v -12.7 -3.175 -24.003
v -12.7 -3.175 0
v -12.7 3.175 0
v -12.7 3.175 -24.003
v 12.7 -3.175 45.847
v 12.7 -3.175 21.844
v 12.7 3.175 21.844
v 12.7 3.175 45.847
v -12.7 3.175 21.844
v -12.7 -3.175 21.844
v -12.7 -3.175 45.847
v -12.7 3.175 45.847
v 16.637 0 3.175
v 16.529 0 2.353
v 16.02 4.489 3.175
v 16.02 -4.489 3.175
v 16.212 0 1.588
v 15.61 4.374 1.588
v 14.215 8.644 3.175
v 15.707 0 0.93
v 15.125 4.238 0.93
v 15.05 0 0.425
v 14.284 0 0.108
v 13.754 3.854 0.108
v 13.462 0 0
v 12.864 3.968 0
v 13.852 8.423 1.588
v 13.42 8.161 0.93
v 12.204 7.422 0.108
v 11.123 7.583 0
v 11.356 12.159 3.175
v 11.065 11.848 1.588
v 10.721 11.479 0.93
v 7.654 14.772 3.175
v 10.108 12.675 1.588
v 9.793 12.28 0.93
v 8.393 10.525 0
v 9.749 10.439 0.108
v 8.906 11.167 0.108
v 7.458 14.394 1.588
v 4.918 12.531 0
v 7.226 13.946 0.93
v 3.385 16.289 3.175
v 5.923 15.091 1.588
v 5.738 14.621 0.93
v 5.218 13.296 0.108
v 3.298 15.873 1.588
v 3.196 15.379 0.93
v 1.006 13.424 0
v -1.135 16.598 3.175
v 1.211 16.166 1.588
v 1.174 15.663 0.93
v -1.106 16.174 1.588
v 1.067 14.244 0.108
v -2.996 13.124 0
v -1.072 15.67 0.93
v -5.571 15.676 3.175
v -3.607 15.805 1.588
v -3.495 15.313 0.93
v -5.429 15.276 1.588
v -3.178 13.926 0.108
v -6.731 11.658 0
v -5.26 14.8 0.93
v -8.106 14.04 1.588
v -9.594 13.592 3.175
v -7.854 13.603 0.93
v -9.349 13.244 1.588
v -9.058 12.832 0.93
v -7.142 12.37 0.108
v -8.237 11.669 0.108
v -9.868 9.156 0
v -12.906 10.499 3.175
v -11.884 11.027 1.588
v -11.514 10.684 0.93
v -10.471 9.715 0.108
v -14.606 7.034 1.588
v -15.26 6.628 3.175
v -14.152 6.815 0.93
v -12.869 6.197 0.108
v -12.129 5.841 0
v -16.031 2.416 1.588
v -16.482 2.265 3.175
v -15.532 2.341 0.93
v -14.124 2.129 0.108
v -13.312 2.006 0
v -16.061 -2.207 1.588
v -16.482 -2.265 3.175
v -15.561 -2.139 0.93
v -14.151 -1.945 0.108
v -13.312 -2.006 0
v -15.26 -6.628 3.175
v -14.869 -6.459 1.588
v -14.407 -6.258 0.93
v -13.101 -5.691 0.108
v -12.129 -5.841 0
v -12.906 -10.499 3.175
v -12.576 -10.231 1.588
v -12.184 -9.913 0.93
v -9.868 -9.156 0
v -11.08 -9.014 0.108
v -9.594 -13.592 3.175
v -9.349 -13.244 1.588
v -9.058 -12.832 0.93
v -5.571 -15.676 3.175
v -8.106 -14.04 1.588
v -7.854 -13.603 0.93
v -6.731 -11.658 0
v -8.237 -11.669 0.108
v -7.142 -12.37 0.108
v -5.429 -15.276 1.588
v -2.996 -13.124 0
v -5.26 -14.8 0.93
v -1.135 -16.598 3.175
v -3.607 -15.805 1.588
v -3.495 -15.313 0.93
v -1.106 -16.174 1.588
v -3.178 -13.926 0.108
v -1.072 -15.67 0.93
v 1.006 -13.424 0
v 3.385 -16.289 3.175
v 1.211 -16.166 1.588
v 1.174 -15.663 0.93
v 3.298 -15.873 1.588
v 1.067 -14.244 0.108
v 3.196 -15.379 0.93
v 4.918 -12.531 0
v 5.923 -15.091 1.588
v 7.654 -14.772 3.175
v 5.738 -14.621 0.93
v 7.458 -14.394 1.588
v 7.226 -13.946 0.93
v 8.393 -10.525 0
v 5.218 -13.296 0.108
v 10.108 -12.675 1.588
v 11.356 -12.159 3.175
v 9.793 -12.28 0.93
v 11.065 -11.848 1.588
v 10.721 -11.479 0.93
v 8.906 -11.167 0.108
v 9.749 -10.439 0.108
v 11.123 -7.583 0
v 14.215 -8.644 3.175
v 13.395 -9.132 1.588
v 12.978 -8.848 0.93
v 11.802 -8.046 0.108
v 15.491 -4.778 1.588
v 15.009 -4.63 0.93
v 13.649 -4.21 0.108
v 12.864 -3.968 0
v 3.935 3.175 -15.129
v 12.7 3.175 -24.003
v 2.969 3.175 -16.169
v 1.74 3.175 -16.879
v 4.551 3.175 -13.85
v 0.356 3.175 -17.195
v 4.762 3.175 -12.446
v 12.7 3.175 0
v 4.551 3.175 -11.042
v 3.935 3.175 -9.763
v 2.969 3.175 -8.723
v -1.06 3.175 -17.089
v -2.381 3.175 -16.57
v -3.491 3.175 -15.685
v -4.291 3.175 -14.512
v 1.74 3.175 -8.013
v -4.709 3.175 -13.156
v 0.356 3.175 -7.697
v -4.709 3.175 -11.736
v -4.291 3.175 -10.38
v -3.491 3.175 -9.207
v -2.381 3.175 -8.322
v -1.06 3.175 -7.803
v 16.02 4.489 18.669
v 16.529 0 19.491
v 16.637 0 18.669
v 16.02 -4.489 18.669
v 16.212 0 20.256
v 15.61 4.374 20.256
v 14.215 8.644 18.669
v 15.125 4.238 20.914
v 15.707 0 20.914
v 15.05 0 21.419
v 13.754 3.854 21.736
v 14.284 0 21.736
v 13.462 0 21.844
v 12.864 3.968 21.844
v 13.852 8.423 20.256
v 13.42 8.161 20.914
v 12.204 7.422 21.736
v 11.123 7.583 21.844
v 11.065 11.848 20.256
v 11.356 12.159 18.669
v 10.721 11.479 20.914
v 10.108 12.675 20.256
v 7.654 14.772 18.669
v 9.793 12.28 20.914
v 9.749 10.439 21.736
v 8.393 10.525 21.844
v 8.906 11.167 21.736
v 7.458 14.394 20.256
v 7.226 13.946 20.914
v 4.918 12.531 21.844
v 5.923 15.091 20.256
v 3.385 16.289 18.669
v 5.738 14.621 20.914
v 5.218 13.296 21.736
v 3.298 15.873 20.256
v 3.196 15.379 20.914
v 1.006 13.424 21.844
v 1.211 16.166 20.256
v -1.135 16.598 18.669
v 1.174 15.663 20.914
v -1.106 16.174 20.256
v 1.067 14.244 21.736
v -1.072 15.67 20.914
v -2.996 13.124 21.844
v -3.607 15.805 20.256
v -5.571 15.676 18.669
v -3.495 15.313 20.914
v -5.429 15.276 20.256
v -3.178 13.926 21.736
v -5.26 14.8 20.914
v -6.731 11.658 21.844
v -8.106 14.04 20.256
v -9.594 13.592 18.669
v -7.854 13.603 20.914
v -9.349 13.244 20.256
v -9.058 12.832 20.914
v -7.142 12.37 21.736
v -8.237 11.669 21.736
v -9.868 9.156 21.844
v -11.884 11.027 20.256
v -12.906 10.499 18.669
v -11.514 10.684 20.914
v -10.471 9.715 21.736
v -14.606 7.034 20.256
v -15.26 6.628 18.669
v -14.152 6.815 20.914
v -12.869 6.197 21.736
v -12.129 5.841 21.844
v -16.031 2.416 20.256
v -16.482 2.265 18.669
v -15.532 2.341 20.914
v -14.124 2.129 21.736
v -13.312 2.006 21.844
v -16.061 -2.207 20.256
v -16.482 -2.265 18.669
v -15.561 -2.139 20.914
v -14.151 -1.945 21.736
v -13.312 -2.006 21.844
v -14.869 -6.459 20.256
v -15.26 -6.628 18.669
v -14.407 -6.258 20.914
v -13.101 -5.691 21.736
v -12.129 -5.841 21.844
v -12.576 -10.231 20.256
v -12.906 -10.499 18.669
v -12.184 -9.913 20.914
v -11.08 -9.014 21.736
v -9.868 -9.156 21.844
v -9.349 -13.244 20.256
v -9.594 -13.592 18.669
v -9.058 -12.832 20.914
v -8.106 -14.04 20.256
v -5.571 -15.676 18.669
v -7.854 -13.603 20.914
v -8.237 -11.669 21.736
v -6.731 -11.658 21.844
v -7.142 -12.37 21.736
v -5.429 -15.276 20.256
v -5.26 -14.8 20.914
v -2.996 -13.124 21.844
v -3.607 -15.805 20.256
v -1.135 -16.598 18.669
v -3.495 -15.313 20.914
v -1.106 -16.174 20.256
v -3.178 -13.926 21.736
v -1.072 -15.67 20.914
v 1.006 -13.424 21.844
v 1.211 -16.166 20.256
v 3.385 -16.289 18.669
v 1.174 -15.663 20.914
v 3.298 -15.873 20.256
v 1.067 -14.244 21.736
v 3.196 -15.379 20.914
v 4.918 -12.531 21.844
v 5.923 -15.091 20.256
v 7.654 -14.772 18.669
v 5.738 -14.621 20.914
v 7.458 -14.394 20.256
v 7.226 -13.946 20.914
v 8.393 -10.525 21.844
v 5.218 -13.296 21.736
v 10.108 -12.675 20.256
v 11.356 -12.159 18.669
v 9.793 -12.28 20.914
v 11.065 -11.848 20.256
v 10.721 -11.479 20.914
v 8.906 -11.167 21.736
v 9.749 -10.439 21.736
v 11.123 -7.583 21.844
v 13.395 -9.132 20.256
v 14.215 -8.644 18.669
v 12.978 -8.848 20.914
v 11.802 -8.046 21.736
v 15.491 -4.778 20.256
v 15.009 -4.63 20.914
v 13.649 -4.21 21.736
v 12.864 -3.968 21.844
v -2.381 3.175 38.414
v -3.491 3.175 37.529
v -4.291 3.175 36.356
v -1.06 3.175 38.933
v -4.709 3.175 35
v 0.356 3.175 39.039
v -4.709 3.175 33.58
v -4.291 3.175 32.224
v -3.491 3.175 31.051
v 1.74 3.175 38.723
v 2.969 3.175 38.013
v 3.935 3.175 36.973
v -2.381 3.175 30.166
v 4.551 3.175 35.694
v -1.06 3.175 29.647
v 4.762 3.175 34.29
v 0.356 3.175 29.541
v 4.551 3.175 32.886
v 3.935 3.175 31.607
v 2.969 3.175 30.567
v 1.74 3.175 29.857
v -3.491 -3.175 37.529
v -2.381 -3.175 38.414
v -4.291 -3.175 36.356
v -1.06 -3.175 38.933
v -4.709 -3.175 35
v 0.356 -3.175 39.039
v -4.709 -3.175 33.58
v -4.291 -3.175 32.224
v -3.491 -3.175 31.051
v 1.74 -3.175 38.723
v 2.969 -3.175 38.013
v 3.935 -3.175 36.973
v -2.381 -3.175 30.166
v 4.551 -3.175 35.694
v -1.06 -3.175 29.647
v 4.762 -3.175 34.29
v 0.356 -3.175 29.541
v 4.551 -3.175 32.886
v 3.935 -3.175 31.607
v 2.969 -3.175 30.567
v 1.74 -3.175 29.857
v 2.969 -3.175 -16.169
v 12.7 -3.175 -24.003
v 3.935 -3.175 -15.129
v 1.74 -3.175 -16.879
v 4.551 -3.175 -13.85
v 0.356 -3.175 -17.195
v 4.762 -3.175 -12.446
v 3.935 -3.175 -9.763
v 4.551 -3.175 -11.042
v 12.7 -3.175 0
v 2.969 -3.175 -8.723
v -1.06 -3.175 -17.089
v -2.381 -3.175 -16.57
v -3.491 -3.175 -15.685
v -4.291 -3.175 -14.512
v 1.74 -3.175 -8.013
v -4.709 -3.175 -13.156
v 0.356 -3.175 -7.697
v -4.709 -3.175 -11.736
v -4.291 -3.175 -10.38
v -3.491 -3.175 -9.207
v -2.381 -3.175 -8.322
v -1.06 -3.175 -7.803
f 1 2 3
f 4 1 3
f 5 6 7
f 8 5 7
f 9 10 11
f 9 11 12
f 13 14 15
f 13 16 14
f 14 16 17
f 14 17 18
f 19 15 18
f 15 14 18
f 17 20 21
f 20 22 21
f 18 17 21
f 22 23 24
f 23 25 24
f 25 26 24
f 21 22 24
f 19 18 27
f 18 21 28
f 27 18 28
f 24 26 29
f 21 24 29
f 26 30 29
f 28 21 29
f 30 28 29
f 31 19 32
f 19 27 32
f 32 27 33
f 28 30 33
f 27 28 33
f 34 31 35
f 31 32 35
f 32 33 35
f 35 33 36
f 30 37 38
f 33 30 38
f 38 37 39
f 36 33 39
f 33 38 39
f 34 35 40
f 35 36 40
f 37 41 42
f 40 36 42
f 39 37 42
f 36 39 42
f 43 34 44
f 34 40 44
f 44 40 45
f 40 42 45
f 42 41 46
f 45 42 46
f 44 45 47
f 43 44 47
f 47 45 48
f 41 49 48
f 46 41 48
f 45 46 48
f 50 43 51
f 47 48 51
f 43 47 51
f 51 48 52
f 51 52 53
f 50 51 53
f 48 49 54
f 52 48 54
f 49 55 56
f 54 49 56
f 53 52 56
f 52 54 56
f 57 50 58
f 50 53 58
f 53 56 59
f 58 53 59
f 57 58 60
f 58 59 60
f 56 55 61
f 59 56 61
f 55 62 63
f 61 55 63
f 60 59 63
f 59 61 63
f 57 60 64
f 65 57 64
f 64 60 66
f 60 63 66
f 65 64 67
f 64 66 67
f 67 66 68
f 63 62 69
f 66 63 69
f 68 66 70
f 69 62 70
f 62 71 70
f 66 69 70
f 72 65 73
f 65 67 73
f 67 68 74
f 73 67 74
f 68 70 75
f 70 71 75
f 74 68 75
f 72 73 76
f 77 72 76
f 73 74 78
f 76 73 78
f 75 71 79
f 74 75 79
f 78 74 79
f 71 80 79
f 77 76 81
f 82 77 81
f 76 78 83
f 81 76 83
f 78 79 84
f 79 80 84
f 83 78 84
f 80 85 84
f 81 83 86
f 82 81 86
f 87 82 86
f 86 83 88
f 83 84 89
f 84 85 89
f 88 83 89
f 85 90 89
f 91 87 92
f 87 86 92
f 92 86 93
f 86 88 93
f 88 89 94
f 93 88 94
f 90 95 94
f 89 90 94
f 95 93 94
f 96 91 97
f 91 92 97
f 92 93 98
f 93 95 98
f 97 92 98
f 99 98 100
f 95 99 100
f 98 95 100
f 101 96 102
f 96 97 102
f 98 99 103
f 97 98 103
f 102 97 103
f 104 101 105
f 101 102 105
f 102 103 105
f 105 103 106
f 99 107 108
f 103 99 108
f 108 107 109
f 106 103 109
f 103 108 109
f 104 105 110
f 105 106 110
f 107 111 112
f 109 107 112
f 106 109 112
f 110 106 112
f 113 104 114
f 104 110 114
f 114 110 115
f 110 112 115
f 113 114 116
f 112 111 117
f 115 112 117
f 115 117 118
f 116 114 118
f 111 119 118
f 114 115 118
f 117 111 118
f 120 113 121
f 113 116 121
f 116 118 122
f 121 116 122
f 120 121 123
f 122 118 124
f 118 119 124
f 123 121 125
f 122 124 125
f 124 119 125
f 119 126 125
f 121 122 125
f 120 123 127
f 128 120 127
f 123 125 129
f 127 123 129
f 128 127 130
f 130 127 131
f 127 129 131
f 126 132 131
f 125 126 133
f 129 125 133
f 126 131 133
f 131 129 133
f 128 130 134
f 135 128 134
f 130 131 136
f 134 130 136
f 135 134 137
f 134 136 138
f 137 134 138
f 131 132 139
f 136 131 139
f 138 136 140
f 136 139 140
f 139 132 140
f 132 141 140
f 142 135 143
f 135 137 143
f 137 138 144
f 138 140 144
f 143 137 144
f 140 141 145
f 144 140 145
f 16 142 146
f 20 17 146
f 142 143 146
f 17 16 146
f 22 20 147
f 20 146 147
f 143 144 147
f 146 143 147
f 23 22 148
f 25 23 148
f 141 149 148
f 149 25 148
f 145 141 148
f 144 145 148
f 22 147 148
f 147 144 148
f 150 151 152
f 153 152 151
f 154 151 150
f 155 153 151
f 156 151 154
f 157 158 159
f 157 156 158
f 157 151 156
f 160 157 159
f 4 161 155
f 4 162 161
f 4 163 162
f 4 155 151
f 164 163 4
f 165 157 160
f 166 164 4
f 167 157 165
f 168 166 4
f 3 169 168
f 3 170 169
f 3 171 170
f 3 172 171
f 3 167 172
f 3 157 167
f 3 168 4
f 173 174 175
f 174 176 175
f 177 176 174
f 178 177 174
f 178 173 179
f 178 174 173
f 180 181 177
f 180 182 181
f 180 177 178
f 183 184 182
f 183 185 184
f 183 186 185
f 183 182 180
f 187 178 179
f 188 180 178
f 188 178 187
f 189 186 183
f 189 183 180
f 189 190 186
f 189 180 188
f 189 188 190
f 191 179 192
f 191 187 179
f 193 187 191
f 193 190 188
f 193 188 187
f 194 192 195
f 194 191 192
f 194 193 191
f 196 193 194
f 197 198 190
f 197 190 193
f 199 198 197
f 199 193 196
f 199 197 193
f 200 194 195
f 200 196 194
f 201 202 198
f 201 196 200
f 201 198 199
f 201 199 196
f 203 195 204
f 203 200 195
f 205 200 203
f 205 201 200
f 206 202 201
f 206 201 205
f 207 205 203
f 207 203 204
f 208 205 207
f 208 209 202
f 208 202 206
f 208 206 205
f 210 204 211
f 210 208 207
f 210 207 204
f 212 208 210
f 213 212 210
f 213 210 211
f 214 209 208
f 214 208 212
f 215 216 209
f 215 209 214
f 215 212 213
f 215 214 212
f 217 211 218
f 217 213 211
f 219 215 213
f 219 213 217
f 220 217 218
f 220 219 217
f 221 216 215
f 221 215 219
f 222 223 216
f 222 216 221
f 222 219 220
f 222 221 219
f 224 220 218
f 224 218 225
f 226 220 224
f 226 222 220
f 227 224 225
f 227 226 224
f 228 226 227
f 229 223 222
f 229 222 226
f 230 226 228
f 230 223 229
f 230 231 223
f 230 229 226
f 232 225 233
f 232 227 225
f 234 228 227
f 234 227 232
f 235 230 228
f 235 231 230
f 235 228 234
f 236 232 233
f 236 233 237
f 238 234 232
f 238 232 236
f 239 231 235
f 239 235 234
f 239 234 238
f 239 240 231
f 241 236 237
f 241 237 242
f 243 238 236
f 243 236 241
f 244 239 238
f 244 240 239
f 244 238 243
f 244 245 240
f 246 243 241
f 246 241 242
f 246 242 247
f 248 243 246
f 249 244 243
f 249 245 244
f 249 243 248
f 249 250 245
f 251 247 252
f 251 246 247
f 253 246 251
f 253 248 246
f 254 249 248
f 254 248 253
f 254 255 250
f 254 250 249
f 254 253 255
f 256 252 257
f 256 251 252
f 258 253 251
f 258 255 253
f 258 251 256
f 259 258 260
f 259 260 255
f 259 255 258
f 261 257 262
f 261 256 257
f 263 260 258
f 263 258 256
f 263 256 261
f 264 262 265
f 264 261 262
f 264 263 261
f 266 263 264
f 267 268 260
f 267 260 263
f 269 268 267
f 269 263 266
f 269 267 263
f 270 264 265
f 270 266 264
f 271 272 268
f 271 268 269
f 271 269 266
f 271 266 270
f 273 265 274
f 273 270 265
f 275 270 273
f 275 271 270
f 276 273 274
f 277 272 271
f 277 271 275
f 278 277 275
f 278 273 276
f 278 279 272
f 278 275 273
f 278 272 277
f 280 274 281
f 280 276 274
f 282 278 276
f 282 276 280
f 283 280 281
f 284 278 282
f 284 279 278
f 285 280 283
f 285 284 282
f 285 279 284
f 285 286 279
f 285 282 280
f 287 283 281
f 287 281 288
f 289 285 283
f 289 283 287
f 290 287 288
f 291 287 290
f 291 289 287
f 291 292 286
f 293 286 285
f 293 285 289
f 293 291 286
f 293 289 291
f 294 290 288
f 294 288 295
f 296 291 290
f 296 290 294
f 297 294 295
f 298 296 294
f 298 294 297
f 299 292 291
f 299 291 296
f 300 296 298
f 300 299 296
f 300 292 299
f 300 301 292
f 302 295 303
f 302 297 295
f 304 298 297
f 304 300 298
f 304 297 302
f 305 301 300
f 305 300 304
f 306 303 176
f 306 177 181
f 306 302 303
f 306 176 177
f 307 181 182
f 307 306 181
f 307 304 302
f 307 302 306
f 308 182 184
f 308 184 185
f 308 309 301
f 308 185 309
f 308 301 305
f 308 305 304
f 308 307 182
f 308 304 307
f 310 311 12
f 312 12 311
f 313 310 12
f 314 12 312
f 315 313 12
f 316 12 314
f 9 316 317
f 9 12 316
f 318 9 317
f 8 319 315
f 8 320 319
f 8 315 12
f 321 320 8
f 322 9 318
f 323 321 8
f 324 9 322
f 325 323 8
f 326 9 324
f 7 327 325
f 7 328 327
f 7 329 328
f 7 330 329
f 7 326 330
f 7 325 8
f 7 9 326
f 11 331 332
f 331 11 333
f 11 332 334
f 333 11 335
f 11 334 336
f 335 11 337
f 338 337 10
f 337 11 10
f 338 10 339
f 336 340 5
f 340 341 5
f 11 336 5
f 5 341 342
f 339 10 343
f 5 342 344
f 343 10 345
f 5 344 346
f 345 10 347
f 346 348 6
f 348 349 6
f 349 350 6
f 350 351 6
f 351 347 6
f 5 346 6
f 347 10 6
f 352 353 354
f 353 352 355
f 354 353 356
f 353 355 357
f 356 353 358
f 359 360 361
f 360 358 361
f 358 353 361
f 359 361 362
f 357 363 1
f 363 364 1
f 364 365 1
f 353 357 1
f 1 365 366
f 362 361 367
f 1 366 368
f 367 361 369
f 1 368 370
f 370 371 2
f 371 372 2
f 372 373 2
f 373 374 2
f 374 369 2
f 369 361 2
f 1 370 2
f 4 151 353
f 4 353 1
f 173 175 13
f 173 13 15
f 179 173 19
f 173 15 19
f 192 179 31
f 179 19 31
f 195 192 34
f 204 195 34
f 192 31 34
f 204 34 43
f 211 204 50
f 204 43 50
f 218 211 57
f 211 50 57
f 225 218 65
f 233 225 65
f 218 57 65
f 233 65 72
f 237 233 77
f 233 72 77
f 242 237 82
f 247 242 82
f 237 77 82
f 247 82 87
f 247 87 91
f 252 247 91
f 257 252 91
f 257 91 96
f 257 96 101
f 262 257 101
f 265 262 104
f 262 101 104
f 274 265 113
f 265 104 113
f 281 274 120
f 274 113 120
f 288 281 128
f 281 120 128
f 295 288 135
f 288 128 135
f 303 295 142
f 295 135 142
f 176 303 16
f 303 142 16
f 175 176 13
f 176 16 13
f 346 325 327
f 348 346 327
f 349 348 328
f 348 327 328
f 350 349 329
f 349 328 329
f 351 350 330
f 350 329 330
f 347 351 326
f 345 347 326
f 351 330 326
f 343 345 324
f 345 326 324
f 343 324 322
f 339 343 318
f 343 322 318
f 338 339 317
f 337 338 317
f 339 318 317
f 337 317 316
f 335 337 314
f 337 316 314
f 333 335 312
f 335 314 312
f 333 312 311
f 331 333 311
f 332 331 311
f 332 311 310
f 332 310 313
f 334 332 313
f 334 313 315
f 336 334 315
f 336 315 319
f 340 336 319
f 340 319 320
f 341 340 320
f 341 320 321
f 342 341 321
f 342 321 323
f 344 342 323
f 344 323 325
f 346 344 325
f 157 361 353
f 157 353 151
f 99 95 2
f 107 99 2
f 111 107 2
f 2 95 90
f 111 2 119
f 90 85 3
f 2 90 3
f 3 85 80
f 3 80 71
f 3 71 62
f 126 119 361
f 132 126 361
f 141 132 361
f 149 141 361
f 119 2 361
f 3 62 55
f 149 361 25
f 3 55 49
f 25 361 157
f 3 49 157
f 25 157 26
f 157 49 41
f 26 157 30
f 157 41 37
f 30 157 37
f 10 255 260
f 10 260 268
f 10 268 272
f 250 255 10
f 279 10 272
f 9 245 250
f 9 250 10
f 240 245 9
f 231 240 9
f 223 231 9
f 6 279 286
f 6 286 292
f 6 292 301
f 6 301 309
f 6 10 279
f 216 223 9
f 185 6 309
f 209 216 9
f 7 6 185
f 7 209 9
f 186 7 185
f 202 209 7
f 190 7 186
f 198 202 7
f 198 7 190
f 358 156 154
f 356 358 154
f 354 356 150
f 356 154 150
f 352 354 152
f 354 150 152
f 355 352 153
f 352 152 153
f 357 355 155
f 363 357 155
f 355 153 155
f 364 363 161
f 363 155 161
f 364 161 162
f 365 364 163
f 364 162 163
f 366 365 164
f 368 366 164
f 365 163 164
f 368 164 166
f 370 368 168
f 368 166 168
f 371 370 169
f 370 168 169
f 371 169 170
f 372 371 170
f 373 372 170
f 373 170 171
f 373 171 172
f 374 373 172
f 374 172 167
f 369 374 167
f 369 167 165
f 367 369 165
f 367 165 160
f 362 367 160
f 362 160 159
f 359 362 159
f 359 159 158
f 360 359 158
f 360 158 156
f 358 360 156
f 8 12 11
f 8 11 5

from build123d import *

# Parameters (mm, degrees)
SKETCH1_R           = 16.637
BOSS_EXTRUDE1_DEPTH = 21.844
SKETCH2_W           = 25.4
SKETCH2_H           = 6.35
BOSS_EXTRUDE2_DEPTH = 24.003
SKETCH3_W           = 25.4
SKETCH3_H           = 6.35
BOSS_EXTRUDE3_DEPTH = 24.003
SKETCH4_R           = 4.7625
CUT_EXTRUDE1_DEPTH  = 20.812
FILLET1_R           = 3.175


with BuildPart() as part:
    # Sketch1 → Boss-Extrude1 (new body)
    with BuildSketch(Plane.XY):
        Circle(SKETCH1_R)
    extrude(amount=BOSS_EXTRUDE1_DEPTH)

    # Sketch2 → Boss-Extrude2 (add)
    with BuildSketch(Plane.XY.offset(21.844)):
        Rectangle(SKETCH2_W, SKETCH2_H)
    extrude(amount=BOSS_EXTRUDE2_DEPTH)

    # Sketch3 → Boss-Extrude3 (add)
    with BuildSketch(Plane(origin=(0, 0, 0), x_dir=(-1, 0, 0), z_dir=(0, 0, -1))):
        Rectangle(SKETCH3_W, SKETCH3_H)
    extrude(amount=BOSS_EXTRUDE3_DEPTH)

    # Sketch4 → Cut-Extrude1 (cut, through all)
    with BuildSketch(Plane(origin=(0, 3.175, 0), x_dir=(1, 0, 0), z_dir=(0, 1, 0))):
        with Locations((0, 12.446)):
            Circle(SKETCH4_R)
        with Locations((0, -34.29)):
            Circle(SKETCH4_R)
    extrude(amount=-CUT_EXTRUDE1_DEPTH, mode=Mode.SUBTRACT)

    # Fillet1
    fillet1_edges = [part.edges().sort_by_distance(p)[0] for p in [
        (-16.637, 0, 0),
        (-16.637, 0, 21.844),
    ]]
    fillet(fillet1_edges, radius=FILLET1_R)


solid = part.part
